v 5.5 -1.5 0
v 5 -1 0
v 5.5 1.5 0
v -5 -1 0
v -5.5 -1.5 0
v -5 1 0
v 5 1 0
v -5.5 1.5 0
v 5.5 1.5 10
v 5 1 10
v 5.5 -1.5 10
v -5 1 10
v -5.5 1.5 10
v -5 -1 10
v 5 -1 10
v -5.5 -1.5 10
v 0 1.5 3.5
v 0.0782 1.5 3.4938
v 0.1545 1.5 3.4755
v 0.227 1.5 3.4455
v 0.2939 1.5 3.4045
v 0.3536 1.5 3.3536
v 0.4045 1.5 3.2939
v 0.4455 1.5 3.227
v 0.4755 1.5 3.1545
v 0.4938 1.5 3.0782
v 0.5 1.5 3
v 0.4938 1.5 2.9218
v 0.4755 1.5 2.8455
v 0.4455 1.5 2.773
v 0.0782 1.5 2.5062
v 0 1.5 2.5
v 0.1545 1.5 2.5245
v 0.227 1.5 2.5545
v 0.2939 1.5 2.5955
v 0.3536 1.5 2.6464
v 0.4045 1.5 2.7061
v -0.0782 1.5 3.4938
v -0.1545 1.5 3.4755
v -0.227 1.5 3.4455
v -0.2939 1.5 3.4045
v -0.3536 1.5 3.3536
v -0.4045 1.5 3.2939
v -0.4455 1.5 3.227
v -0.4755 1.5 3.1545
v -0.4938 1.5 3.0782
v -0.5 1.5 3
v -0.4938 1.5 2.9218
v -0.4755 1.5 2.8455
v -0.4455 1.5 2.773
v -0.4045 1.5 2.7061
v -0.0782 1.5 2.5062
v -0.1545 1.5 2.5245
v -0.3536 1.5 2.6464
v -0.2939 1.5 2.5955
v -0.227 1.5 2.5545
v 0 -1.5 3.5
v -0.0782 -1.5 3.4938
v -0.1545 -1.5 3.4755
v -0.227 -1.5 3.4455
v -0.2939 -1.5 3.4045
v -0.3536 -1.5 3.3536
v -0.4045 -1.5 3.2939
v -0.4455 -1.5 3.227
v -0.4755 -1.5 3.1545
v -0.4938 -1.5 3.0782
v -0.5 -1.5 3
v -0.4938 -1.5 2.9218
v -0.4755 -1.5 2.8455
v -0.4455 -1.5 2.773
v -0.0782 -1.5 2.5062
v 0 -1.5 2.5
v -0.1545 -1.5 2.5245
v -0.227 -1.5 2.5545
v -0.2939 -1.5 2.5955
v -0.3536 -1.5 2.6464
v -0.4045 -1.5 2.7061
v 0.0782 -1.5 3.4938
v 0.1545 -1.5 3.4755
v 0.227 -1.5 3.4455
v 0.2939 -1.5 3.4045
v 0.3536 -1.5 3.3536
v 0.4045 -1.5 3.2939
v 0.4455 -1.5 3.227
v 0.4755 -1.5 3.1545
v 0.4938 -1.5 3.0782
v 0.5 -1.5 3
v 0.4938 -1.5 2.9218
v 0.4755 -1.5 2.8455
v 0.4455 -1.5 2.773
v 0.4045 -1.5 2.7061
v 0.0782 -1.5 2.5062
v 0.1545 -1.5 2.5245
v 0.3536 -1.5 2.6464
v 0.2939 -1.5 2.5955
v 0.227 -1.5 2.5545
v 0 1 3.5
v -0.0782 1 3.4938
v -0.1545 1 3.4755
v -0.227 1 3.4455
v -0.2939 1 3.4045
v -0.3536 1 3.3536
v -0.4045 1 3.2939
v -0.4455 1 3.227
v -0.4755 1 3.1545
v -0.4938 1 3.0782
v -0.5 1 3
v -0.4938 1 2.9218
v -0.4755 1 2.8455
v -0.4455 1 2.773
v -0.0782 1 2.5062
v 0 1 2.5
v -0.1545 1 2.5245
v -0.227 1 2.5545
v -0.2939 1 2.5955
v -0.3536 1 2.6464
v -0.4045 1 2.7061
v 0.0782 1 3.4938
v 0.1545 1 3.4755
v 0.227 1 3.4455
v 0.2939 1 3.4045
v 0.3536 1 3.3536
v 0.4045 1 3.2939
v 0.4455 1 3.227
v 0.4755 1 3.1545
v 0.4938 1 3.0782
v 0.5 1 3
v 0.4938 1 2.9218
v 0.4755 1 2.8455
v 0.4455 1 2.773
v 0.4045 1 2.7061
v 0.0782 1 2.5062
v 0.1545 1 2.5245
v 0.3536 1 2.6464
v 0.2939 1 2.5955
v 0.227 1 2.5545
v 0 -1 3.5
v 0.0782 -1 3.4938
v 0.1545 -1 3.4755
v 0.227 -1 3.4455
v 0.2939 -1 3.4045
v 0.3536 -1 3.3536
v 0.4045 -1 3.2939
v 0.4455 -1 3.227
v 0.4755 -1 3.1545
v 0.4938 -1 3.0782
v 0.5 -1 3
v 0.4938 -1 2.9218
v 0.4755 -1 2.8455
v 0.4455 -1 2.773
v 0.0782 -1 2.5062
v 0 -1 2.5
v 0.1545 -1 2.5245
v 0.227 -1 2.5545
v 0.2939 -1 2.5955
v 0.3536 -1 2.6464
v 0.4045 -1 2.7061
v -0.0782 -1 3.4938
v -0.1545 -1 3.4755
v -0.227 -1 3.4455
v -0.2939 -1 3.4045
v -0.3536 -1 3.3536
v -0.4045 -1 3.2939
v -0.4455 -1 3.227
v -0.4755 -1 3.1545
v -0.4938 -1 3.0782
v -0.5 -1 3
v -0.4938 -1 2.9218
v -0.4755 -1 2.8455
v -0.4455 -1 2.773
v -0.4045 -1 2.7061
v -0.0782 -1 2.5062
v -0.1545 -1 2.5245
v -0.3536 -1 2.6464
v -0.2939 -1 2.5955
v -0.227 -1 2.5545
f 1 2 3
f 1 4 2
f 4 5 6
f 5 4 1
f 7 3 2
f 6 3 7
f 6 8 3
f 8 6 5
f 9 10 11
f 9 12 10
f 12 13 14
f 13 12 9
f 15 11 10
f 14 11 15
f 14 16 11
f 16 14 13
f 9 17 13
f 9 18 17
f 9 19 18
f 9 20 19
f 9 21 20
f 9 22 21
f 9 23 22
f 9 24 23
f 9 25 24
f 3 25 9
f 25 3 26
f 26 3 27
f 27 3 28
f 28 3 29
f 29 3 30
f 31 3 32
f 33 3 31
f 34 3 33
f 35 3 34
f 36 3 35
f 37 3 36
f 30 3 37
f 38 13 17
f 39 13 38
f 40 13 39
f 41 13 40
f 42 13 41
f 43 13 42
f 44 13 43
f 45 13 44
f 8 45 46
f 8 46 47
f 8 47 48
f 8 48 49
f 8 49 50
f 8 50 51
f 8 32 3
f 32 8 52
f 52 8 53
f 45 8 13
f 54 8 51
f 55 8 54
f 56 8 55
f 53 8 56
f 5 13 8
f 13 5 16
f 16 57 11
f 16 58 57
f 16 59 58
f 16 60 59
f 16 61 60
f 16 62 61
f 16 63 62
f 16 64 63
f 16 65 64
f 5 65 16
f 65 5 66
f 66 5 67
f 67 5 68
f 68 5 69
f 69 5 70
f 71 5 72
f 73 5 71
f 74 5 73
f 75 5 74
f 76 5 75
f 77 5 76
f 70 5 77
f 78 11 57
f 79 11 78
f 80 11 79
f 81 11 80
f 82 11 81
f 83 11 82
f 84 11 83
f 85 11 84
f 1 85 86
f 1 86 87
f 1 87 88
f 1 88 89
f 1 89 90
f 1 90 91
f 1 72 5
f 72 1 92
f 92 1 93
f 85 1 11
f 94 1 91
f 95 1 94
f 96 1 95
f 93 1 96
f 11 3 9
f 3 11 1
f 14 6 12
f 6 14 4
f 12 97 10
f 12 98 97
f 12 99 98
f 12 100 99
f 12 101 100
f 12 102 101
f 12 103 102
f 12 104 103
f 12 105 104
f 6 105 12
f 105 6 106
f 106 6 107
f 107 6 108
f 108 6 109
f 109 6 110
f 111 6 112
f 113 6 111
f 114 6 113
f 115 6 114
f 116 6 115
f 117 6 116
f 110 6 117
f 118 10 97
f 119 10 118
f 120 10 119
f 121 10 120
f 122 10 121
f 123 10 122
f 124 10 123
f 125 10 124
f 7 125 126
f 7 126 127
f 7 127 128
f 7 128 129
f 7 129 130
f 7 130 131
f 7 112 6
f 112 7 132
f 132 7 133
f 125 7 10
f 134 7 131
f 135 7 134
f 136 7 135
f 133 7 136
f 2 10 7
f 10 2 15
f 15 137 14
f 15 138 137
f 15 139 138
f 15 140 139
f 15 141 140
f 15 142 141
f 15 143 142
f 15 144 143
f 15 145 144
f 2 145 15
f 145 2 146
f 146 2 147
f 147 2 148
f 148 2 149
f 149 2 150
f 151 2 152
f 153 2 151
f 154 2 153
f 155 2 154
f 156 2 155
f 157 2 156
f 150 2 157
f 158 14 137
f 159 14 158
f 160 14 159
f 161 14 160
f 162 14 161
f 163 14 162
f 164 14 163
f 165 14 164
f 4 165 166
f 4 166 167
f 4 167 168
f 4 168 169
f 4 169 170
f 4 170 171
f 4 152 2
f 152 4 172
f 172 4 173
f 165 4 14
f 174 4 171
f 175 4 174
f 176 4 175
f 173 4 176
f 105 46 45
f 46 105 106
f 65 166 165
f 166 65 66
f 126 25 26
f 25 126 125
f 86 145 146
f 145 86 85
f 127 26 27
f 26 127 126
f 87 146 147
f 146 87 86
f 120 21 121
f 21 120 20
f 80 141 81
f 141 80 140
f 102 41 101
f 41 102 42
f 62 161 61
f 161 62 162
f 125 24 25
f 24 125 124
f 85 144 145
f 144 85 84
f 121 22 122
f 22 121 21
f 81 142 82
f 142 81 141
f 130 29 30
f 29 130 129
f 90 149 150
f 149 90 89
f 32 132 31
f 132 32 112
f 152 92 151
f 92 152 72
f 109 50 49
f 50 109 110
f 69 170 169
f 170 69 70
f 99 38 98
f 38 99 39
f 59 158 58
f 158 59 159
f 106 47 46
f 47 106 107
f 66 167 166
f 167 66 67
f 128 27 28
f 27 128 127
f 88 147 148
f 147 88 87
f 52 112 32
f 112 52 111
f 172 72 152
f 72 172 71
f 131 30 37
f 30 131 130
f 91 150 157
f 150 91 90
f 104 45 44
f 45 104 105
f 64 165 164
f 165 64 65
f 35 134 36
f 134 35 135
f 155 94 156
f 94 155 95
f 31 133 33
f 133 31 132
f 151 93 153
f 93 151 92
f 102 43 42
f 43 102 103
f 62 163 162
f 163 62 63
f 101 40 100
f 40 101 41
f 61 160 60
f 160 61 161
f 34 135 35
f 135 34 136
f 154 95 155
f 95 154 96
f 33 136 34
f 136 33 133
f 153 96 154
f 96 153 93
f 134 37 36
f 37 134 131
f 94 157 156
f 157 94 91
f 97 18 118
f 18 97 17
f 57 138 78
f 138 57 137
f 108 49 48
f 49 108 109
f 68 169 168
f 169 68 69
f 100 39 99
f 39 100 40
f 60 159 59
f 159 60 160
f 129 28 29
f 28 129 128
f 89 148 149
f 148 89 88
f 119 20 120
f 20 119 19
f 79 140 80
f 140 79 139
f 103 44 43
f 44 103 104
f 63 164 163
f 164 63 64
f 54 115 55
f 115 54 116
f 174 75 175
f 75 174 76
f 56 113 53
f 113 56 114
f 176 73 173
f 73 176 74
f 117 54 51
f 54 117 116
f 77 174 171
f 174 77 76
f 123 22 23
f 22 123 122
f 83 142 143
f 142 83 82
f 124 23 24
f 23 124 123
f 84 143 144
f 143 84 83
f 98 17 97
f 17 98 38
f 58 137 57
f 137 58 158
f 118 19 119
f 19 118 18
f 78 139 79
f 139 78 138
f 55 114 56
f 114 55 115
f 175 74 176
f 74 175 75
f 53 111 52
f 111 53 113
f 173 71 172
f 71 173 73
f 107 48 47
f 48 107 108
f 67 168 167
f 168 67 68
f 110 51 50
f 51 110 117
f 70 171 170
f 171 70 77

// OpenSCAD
//!OpenSCAD
/*
>>> made by UniversalMaker
*/
// thickness of the wall in mm
Material_thickness = 1;
// top part width of the key in mm
key_handle_width = 10;
// top part height of the key in mm
key_handle_height = 2;
// top part length of the key in mm
key_handle_length = 10;
// drilling hole diameter in mm
hole_diameter = 1;
// position of the hole in mm
hole_x_position = 0;
// position of the hole in mm
hole_y_position = 3;

difference() {
  linear_extrude( height=key_handle_width, twist=0, scale=[1, 1], center=false){
    difference() {
      square([(key_handle_length + Material_thickness), (key_handle_height + Material_thickness)], center=true);

      square([key_handle_length, key_handle_height], center=true);
    }
  }

  translate([hole_x_position, 50, hole_y_position]){
    {
      $fn=40;    //set sides to 40
      rotate([90, 0, 0]){
        cylinder(r1=hole_diameter/2, r2=hole_diameter/2, h=100, center=false);
      }
    }
  }
}
